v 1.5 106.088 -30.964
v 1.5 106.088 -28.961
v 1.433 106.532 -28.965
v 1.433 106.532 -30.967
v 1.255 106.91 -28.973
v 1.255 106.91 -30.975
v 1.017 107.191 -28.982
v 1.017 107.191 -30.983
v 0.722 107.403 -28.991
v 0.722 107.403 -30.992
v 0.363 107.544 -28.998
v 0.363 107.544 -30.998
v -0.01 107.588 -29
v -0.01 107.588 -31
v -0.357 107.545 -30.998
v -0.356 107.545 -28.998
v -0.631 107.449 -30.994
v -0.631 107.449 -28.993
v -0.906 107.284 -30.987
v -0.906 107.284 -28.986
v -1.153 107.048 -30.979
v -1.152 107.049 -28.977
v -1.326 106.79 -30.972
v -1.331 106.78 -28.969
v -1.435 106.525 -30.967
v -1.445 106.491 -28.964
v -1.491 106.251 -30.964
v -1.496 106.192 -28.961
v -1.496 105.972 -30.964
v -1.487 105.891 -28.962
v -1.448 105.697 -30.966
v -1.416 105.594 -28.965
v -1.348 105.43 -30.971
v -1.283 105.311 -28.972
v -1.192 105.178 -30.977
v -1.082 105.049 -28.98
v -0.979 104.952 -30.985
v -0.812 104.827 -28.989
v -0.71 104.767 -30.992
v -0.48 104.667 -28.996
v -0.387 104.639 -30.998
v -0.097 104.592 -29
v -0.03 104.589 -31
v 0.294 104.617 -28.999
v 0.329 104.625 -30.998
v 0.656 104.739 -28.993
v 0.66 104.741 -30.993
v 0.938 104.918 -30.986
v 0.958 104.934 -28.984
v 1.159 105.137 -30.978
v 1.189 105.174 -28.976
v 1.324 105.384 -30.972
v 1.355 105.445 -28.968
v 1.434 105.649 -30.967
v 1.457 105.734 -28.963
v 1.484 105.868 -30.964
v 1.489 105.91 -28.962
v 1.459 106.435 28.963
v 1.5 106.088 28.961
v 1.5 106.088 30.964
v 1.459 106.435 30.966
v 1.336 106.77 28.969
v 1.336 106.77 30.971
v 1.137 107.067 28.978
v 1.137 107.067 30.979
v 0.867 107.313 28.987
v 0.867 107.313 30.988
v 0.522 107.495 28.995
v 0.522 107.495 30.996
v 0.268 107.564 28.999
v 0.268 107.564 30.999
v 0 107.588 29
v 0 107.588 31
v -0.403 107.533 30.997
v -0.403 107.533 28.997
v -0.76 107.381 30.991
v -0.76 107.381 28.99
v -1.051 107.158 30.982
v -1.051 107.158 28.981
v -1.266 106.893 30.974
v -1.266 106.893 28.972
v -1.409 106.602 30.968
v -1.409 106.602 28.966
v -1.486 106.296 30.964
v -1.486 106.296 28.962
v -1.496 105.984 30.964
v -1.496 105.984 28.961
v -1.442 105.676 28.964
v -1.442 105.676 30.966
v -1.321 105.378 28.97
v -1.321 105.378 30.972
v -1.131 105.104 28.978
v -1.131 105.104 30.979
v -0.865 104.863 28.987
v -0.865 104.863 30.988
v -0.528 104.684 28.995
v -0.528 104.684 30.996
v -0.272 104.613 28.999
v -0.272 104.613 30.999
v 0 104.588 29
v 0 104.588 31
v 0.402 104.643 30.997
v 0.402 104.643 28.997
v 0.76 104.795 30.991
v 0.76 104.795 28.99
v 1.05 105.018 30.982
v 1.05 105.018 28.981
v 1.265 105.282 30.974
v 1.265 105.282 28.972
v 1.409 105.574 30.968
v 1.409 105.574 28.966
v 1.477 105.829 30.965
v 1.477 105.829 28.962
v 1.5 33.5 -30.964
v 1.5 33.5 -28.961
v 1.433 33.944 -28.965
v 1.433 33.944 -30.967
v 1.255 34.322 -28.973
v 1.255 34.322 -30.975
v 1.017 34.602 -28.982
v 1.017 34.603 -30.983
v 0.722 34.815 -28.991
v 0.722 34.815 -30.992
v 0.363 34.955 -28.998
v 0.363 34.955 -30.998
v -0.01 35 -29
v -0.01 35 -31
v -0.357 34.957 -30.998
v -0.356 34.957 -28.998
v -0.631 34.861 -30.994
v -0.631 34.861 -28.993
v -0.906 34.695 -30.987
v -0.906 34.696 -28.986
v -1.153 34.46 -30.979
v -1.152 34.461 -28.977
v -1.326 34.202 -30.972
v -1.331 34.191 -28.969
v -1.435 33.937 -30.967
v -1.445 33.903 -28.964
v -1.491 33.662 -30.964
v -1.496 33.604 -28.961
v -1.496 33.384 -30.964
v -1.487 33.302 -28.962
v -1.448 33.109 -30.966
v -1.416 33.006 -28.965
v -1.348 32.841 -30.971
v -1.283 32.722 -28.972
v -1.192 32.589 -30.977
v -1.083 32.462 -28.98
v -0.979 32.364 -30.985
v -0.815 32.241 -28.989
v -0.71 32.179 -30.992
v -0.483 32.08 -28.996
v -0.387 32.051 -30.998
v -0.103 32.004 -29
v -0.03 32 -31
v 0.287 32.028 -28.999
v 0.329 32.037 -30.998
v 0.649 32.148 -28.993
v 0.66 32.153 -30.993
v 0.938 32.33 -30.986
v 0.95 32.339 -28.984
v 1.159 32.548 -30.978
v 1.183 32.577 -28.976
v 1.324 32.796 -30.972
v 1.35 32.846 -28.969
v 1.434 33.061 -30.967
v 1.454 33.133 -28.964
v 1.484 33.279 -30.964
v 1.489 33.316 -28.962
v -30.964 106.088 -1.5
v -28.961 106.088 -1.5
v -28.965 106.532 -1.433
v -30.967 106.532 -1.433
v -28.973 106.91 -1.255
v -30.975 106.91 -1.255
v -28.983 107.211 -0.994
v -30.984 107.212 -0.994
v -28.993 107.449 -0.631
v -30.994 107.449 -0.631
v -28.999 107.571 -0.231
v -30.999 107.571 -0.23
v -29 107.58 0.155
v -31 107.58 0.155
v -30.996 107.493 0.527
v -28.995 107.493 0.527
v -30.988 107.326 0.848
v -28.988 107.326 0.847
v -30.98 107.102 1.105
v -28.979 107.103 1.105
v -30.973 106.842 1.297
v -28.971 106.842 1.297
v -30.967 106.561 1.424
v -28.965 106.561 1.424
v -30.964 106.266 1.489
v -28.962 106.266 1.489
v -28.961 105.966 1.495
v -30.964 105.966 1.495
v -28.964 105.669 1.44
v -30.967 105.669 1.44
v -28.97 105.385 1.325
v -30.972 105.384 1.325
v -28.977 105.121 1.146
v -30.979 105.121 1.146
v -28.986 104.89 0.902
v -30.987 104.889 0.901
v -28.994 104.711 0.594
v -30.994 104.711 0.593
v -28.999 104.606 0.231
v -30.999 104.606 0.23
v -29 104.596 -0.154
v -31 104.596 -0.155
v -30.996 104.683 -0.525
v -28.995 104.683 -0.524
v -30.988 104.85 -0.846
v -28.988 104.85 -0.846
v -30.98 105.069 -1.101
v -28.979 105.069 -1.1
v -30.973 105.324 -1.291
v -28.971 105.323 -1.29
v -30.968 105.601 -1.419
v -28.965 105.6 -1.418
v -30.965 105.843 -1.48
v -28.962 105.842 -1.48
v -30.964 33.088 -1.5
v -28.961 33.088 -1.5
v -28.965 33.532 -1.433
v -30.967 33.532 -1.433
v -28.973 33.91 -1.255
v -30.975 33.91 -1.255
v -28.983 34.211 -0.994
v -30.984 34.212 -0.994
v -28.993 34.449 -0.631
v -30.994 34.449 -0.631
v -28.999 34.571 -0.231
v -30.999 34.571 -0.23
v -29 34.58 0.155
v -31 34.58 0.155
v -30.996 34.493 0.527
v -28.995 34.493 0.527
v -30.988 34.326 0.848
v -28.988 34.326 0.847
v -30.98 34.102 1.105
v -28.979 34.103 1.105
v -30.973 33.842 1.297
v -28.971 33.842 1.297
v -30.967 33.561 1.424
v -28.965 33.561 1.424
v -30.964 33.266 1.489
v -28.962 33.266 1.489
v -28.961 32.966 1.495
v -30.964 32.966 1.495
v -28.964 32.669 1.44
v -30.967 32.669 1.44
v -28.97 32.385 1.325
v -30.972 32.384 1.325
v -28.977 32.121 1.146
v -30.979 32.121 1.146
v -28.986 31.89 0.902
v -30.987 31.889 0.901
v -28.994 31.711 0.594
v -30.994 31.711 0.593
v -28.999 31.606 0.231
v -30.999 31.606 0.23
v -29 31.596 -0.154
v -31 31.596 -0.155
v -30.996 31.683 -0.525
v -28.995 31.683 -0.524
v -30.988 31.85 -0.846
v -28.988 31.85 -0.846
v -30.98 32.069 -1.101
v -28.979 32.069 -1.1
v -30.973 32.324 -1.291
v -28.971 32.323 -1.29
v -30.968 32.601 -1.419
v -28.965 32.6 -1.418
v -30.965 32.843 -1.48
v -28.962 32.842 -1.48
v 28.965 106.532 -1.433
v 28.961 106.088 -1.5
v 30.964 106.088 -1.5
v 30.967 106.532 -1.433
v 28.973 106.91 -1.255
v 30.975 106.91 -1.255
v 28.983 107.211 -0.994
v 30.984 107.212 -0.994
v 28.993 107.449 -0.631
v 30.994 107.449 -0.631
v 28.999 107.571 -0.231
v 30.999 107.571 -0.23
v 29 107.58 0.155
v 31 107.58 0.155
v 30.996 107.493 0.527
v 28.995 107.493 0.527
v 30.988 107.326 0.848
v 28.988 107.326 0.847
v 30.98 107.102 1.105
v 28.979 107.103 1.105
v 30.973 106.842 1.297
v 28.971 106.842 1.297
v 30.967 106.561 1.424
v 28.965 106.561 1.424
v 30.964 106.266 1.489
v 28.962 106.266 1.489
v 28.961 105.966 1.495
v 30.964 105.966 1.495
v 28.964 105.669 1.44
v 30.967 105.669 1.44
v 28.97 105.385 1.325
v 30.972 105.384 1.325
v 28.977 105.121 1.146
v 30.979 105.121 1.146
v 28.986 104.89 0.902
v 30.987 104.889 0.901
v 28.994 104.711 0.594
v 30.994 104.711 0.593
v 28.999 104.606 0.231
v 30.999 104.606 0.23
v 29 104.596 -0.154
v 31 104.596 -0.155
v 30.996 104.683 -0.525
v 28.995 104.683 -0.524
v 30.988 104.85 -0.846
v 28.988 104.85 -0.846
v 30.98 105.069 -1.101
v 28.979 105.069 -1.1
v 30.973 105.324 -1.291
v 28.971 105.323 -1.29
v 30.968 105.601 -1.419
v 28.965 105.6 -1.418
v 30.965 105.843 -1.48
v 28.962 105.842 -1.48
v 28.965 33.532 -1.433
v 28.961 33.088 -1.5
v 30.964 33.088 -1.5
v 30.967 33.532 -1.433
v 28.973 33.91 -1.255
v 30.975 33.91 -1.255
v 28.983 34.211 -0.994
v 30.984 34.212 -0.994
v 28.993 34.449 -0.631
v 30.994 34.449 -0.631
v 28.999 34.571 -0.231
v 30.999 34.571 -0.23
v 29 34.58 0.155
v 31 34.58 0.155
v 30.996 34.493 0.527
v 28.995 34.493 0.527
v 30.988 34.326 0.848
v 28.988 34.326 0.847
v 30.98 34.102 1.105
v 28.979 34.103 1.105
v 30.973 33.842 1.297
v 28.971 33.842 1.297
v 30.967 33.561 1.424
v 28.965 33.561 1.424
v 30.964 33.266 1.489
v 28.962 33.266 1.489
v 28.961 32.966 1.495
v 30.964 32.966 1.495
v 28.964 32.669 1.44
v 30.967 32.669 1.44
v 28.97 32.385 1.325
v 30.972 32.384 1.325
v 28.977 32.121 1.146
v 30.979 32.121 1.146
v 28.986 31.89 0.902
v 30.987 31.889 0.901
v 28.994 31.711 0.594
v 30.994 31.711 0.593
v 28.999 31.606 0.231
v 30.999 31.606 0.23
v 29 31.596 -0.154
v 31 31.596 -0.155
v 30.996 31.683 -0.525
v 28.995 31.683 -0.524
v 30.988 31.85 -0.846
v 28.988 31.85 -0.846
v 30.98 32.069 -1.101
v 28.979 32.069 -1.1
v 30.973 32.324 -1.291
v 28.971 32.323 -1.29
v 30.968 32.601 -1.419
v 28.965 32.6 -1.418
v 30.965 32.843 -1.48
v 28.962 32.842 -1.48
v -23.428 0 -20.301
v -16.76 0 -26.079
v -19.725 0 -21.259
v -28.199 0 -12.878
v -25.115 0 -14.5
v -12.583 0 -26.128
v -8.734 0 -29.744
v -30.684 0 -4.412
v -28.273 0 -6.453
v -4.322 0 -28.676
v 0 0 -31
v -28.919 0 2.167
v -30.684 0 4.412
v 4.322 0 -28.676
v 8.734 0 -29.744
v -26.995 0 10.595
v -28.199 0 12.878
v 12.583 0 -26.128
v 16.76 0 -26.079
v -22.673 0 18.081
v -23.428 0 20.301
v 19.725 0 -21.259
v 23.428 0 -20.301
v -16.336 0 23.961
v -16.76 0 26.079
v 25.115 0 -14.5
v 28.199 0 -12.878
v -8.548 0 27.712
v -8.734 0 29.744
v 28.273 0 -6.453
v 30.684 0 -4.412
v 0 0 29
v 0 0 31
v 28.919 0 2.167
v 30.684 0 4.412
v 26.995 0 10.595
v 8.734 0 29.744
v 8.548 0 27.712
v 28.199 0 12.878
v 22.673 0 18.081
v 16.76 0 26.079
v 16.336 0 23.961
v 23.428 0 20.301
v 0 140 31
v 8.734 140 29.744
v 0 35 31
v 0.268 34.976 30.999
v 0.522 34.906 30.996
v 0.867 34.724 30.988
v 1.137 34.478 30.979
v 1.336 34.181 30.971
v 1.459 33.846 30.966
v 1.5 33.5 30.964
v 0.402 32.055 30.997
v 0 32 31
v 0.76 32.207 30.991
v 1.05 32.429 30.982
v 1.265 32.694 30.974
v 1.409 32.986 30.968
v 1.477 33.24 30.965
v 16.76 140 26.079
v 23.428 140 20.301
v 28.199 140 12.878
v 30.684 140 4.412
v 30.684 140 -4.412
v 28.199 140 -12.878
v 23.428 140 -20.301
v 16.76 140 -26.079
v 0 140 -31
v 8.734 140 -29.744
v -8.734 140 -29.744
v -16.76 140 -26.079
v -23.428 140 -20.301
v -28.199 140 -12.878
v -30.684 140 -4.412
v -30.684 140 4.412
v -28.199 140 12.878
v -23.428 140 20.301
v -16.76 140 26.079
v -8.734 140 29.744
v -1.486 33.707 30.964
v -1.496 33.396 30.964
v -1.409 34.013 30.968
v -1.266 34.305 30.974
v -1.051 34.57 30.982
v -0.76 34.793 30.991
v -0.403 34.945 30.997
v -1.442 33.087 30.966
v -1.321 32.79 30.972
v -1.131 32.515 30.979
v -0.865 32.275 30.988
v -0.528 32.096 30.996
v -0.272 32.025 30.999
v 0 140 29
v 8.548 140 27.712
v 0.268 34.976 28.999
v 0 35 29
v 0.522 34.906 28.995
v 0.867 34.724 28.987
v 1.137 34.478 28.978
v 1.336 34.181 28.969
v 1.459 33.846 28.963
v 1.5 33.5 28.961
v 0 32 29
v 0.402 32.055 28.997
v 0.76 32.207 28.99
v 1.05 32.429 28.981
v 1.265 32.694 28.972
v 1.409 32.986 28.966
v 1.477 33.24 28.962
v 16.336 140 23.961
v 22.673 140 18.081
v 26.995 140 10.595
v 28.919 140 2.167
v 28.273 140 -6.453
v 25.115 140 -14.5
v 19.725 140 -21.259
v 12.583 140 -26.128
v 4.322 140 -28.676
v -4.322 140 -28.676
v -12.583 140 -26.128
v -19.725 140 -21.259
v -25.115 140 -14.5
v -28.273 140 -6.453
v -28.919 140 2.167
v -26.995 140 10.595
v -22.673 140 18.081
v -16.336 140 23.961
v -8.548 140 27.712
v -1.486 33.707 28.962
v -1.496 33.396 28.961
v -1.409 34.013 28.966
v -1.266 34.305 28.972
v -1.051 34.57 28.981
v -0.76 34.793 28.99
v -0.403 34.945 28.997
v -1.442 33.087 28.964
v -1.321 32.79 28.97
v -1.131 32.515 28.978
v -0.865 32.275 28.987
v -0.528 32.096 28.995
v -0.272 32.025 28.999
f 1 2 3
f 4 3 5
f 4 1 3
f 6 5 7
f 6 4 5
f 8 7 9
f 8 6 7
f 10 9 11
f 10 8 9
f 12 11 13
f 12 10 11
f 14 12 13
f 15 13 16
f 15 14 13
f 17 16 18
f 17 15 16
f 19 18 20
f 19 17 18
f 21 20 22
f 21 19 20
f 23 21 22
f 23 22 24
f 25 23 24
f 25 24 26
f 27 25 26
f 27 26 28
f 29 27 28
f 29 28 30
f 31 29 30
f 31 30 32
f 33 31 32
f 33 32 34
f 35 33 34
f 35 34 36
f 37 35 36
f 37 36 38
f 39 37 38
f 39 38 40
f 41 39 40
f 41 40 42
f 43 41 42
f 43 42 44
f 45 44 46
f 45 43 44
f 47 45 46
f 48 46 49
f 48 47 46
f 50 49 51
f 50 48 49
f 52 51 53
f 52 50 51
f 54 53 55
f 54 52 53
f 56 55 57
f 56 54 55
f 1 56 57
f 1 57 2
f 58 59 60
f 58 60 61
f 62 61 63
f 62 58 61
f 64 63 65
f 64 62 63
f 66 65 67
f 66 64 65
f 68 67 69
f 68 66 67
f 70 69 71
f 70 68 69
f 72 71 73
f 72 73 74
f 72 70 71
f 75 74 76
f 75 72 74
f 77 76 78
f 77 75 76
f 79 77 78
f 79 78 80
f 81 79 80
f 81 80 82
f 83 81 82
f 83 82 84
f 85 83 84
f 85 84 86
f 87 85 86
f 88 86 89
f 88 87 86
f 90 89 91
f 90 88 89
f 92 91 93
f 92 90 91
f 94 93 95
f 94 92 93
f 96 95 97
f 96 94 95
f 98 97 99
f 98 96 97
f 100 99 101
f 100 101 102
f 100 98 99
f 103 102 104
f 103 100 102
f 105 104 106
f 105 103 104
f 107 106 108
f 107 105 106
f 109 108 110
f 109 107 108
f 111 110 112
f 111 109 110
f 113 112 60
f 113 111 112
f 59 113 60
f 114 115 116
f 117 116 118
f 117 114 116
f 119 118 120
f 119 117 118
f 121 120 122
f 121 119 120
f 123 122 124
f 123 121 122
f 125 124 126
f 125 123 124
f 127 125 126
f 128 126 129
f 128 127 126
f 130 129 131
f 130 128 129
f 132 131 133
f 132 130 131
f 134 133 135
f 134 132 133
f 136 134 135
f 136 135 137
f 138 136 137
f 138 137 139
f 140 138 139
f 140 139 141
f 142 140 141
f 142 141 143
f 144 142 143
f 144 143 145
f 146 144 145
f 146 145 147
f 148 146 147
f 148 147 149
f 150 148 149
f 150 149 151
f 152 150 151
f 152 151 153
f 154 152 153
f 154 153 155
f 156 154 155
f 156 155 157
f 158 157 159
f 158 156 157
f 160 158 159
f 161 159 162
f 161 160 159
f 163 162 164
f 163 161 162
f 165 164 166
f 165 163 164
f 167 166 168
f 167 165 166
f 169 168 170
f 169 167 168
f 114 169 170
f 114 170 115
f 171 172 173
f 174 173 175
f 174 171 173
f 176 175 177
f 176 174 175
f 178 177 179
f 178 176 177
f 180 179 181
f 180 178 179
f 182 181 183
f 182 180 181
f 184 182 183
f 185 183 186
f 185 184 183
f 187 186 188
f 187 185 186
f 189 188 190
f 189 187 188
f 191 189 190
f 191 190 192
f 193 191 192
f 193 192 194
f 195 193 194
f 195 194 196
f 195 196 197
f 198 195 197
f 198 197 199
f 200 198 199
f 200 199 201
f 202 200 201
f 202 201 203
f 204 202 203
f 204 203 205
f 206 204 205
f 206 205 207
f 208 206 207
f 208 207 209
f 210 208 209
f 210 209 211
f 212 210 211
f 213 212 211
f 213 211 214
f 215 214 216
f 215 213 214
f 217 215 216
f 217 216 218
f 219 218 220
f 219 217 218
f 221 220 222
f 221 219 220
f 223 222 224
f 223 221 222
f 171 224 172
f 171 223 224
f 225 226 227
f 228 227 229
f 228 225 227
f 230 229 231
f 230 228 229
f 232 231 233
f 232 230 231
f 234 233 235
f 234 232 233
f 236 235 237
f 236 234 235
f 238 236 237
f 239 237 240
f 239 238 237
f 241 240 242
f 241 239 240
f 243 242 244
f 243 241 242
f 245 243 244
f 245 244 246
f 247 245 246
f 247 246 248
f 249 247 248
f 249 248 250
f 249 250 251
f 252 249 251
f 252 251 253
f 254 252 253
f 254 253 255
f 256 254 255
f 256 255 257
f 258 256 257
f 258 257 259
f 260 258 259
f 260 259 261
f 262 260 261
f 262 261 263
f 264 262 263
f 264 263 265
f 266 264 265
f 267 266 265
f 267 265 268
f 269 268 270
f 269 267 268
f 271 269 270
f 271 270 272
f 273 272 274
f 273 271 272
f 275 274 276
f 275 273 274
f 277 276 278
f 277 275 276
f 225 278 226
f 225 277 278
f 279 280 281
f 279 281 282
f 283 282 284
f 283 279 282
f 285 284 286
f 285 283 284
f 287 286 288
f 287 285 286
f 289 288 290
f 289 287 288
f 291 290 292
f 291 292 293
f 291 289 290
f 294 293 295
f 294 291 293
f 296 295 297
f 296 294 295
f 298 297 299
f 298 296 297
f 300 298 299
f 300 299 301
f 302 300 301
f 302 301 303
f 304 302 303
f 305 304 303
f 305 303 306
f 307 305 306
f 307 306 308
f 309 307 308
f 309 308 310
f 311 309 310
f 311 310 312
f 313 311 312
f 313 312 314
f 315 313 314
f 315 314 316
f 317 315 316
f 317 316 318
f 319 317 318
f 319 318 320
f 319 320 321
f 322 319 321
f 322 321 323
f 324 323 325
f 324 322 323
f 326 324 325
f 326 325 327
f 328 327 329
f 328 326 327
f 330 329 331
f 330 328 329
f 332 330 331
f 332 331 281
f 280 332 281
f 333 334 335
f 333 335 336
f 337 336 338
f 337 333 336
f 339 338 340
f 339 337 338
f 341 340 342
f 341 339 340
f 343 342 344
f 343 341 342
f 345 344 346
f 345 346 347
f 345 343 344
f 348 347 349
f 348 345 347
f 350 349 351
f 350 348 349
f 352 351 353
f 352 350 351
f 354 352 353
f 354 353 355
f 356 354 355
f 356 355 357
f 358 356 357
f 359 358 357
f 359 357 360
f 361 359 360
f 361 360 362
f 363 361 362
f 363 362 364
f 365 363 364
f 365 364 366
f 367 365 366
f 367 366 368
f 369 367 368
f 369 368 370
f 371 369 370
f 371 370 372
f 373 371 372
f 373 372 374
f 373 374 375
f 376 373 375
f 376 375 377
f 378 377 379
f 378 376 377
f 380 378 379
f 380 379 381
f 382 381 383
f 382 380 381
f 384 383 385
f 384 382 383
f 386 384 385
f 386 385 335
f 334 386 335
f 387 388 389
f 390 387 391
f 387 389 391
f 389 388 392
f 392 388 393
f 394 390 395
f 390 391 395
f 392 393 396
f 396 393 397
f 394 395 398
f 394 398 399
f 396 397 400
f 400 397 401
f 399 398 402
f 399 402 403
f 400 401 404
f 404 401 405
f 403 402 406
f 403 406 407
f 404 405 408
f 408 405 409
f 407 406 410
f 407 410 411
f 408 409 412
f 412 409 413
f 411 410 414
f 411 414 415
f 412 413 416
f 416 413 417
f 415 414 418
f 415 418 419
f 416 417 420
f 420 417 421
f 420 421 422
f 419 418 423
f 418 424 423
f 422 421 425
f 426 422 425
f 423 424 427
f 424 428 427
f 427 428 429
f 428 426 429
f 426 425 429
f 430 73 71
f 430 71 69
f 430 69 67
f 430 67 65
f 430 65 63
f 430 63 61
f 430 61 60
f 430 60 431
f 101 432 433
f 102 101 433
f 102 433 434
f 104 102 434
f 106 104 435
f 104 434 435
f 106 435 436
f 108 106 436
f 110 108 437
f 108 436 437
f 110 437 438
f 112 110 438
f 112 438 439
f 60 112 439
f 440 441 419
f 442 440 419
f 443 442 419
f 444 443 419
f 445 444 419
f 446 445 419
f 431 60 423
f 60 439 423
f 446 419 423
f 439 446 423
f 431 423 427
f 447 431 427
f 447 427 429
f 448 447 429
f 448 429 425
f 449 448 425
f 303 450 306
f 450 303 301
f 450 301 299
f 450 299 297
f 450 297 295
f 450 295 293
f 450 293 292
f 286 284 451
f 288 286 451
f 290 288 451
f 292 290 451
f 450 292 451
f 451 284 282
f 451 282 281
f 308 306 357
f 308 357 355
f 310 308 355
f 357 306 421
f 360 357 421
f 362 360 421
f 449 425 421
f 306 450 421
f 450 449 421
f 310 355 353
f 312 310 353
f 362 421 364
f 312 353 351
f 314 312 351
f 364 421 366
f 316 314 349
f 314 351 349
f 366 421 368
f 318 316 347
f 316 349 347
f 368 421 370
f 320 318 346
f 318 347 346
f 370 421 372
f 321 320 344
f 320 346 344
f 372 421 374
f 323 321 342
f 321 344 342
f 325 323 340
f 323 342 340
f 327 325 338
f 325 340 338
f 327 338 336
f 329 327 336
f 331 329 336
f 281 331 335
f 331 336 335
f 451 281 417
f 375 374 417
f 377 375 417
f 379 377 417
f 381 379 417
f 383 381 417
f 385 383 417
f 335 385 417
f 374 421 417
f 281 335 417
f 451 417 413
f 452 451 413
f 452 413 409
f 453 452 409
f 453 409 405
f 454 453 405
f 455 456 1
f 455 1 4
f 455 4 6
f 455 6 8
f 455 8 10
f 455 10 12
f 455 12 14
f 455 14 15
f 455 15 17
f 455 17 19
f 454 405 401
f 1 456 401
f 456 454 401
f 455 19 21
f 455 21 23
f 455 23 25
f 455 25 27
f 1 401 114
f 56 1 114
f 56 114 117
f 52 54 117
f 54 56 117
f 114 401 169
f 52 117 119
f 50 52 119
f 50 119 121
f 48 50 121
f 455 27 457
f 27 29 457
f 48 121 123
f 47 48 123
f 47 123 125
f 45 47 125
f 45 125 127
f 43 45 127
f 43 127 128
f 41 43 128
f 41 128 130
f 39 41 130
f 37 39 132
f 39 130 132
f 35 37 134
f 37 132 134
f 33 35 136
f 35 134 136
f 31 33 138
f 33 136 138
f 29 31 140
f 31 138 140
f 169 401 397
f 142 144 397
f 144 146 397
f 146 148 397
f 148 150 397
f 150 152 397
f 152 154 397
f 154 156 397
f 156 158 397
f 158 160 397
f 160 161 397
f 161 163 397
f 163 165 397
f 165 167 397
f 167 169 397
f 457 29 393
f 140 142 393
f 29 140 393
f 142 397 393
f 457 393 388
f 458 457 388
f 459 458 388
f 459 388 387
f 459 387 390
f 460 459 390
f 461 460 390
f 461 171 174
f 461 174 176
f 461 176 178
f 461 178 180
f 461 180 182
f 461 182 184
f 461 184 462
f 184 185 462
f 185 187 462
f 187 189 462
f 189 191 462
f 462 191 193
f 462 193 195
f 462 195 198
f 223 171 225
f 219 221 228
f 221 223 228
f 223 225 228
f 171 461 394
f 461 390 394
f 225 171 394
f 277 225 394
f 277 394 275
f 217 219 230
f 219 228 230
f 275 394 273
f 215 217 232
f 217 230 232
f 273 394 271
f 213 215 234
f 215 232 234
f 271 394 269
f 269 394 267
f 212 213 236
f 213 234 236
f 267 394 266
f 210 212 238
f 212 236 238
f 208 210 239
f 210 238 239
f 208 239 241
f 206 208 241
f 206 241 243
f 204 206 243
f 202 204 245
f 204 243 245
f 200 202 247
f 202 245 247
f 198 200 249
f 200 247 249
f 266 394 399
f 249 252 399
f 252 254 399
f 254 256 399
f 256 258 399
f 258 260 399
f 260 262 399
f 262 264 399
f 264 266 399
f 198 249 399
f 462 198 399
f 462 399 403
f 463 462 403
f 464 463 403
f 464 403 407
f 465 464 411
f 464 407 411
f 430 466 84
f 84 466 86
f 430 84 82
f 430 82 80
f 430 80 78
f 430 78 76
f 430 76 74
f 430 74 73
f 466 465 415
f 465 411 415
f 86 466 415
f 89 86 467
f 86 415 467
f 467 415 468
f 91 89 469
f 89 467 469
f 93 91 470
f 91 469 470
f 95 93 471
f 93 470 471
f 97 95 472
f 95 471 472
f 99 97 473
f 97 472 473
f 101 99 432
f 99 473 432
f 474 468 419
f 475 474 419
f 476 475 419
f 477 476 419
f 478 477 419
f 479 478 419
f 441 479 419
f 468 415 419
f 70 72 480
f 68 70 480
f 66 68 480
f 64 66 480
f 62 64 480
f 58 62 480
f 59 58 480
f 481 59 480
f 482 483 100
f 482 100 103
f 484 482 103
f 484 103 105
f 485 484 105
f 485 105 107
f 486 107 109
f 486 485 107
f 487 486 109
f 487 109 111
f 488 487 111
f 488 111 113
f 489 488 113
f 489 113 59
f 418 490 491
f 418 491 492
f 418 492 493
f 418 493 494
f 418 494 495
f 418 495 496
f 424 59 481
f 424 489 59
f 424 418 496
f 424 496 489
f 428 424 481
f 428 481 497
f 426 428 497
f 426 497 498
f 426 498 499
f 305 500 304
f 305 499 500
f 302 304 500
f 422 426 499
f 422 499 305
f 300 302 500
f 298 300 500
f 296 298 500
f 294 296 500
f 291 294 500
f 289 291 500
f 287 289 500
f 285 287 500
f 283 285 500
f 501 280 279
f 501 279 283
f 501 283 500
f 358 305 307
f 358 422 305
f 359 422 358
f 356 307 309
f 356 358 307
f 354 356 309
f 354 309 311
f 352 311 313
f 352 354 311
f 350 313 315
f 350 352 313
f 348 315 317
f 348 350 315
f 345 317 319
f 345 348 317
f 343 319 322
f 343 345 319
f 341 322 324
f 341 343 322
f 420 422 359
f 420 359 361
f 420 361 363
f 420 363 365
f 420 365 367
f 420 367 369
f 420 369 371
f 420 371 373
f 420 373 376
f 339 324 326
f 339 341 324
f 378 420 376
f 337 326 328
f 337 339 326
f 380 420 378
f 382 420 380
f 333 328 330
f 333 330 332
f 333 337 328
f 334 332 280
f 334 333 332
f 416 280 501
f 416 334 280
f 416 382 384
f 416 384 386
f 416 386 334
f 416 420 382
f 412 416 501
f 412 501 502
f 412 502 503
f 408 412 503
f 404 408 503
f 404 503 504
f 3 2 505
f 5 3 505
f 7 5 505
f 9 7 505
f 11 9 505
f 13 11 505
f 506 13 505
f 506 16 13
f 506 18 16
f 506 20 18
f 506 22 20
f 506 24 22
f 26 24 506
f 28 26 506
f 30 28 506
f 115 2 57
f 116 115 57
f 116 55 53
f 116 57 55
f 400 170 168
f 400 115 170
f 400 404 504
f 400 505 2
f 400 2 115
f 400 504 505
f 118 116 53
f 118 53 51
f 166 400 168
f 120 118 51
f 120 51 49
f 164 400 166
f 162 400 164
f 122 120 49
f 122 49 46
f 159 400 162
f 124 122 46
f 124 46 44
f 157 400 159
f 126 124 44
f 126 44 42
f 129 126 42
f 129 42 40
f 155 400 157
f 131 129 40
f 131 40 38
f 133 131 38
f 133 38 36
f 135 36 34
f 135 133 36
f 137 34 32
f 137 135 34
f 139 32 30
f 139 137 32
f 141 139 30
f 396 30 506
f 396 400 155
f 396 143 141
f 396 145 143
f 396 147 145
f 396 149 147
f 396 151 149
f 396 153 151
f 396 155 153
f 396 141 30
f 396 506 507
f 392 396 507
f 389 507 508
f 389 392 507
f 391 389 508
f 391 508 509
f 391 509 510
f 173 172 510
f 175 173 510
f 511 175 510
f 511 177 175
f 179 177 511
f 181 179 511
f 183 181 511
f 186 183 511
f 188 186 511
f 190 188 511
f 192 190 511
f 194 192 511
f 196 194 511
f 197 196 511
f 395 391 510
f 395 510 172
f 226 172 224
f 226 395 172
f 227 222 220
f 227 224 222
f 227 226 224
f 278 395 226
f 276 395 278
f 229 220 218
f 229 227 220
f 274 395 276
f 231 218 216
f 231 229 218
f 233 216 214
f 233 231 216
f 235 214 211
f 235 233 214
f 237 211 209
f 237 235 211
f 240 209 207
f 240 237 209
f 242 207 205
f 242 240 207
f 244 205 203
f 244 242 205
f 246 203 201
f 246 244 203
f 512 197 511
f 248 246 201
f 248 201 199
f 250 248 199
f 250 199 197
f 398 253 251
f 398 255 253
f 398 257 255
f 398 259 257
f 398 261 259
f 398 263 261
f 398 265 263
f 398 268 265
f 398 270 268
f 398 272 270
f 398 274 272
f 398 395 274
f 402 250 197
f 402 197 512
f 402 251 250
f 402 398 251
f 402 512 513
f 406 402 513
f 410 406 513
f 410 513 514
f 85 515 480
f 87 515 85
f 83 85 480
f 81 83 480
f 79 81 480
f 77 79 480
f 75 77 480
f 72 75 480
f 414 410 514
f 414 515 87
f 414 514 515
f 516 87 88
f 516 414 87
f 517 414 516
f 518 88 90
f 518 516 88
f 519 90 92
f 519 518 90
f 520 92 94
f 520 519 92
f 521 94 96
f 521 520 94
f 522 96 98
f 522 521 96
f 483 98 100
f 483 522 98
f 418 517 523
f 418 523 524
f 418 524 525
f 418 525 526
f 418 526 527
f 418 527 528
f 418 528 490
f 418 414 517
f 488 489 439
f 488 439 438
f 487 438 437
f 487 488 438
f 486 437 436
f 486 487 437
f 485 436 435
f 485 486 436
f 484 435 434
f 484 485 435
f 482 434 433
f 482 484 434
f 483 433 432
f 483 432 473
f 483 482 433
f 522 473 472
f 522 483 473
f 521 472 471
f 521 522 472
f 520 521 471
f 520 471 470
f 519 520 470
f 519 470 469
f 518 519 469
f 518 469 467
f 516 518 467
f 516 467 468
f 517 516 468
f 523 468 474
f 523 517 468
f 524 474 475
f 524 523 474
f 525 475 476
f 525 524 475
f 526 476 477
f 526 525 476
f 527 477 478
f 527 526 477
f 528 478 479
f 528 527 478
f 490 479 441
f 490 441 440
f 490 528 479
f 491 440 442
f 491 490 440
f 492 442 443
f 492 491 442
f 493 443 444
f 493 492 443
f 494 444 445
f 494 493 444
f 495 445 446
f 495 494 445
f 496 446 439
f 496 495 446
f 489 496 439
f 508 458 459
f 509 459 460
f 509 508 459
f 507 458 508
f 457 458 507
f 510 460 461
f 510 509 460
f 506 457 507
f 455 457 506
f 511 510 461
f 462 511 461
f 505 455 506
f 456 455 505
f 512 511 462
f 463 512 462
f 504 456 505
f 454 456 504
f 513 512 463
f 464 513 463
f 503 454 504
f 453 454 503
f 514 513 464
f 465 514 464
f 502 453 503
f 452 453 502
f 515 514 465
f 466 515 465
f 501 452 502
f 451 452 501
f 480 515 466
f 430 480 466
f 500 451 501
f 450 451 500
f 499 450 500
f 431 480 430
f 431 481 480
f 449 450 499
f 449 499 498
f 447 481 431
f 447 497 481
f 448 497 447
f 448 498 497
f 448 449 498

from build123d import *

# Parameters (mm, degrees)
SKETCH1_R               = 31
SKETCH1_R_2             = 29
BOSS_EXTRUDE1_DEPTH     = 140
CUT_EXTRUDE1_DEPTH      = 147.703783182
CUT_EXTRUDE1_DEPTH_BACK = 147.703783182
SKETCH2_R               = 1.5
CUT_EXTRUDE2_DEPTH      = 147.703783323
CUT_EXTRUDE2_DEPTH_BACK = 147.703783323
SKETCH3_R               = 1.5


with BuildPart() as part:
    # Sketch1 → Boss-Extrude1 (new body)
    with BuildSketch(Plane(origin=(0, 0, 0), x_dir=(1, 0, 0), z_dir=(0, 1, 0))):
        with Locations(Location((0, 0, 0), (0, 0, 270))):
            Circle(SKETCH1_R)
        with Locations(Location((0, 0, 0), (0, 0, 270))):
            Circle(SKETCH1_R_2, mode=Mode.SUBTRACT)
    extrude(amount=BOSS_EXTRUDE1_DEPTH)

    # Sketch2 → Cut-Extrude1 (cut, two sides: drawn at the far end of the back side and taken through both)
    with BuildSketch(Plane(origin=(0, 0, 0), x_dir=(0, 0, -1), z_dir=(1, 0, 0)).offset(-CUT_EXTRUDE1_DEPTH_BACK)):
        with Locations((0, 33.088409151)):
            Circle(SKETCH2_R)
        with Locations((0, 106.088409151)):
            Circle(SKETCH2_R)
    extrude(amount=CUT_EXTRUDE1_DEPTH + CUT_EXTRUDE1_DEPTH_BACK, mode=Mode.SUBTRACT)

    # Sketch3 → Cut-Extrude2 (cut, two sides: drawn at the far end of the back side and taken through both)
    with BuildSketch(Plane.XY.offset(-CUT_EXTRUDE2_DEPTH_BACK)):
        with Locations((0, 106.088379232)):
            Circle(SKETCH3_R)
        with Locations((0, 33.5)):
            Circle(SKETCH3_R)
    extrude(amount=CUT_EXTRUDE2_DEPTH + CUT_EXTRUDE2_DEPTH_BACK, mode=Mode.SUBTRACT)


solid = part.part
